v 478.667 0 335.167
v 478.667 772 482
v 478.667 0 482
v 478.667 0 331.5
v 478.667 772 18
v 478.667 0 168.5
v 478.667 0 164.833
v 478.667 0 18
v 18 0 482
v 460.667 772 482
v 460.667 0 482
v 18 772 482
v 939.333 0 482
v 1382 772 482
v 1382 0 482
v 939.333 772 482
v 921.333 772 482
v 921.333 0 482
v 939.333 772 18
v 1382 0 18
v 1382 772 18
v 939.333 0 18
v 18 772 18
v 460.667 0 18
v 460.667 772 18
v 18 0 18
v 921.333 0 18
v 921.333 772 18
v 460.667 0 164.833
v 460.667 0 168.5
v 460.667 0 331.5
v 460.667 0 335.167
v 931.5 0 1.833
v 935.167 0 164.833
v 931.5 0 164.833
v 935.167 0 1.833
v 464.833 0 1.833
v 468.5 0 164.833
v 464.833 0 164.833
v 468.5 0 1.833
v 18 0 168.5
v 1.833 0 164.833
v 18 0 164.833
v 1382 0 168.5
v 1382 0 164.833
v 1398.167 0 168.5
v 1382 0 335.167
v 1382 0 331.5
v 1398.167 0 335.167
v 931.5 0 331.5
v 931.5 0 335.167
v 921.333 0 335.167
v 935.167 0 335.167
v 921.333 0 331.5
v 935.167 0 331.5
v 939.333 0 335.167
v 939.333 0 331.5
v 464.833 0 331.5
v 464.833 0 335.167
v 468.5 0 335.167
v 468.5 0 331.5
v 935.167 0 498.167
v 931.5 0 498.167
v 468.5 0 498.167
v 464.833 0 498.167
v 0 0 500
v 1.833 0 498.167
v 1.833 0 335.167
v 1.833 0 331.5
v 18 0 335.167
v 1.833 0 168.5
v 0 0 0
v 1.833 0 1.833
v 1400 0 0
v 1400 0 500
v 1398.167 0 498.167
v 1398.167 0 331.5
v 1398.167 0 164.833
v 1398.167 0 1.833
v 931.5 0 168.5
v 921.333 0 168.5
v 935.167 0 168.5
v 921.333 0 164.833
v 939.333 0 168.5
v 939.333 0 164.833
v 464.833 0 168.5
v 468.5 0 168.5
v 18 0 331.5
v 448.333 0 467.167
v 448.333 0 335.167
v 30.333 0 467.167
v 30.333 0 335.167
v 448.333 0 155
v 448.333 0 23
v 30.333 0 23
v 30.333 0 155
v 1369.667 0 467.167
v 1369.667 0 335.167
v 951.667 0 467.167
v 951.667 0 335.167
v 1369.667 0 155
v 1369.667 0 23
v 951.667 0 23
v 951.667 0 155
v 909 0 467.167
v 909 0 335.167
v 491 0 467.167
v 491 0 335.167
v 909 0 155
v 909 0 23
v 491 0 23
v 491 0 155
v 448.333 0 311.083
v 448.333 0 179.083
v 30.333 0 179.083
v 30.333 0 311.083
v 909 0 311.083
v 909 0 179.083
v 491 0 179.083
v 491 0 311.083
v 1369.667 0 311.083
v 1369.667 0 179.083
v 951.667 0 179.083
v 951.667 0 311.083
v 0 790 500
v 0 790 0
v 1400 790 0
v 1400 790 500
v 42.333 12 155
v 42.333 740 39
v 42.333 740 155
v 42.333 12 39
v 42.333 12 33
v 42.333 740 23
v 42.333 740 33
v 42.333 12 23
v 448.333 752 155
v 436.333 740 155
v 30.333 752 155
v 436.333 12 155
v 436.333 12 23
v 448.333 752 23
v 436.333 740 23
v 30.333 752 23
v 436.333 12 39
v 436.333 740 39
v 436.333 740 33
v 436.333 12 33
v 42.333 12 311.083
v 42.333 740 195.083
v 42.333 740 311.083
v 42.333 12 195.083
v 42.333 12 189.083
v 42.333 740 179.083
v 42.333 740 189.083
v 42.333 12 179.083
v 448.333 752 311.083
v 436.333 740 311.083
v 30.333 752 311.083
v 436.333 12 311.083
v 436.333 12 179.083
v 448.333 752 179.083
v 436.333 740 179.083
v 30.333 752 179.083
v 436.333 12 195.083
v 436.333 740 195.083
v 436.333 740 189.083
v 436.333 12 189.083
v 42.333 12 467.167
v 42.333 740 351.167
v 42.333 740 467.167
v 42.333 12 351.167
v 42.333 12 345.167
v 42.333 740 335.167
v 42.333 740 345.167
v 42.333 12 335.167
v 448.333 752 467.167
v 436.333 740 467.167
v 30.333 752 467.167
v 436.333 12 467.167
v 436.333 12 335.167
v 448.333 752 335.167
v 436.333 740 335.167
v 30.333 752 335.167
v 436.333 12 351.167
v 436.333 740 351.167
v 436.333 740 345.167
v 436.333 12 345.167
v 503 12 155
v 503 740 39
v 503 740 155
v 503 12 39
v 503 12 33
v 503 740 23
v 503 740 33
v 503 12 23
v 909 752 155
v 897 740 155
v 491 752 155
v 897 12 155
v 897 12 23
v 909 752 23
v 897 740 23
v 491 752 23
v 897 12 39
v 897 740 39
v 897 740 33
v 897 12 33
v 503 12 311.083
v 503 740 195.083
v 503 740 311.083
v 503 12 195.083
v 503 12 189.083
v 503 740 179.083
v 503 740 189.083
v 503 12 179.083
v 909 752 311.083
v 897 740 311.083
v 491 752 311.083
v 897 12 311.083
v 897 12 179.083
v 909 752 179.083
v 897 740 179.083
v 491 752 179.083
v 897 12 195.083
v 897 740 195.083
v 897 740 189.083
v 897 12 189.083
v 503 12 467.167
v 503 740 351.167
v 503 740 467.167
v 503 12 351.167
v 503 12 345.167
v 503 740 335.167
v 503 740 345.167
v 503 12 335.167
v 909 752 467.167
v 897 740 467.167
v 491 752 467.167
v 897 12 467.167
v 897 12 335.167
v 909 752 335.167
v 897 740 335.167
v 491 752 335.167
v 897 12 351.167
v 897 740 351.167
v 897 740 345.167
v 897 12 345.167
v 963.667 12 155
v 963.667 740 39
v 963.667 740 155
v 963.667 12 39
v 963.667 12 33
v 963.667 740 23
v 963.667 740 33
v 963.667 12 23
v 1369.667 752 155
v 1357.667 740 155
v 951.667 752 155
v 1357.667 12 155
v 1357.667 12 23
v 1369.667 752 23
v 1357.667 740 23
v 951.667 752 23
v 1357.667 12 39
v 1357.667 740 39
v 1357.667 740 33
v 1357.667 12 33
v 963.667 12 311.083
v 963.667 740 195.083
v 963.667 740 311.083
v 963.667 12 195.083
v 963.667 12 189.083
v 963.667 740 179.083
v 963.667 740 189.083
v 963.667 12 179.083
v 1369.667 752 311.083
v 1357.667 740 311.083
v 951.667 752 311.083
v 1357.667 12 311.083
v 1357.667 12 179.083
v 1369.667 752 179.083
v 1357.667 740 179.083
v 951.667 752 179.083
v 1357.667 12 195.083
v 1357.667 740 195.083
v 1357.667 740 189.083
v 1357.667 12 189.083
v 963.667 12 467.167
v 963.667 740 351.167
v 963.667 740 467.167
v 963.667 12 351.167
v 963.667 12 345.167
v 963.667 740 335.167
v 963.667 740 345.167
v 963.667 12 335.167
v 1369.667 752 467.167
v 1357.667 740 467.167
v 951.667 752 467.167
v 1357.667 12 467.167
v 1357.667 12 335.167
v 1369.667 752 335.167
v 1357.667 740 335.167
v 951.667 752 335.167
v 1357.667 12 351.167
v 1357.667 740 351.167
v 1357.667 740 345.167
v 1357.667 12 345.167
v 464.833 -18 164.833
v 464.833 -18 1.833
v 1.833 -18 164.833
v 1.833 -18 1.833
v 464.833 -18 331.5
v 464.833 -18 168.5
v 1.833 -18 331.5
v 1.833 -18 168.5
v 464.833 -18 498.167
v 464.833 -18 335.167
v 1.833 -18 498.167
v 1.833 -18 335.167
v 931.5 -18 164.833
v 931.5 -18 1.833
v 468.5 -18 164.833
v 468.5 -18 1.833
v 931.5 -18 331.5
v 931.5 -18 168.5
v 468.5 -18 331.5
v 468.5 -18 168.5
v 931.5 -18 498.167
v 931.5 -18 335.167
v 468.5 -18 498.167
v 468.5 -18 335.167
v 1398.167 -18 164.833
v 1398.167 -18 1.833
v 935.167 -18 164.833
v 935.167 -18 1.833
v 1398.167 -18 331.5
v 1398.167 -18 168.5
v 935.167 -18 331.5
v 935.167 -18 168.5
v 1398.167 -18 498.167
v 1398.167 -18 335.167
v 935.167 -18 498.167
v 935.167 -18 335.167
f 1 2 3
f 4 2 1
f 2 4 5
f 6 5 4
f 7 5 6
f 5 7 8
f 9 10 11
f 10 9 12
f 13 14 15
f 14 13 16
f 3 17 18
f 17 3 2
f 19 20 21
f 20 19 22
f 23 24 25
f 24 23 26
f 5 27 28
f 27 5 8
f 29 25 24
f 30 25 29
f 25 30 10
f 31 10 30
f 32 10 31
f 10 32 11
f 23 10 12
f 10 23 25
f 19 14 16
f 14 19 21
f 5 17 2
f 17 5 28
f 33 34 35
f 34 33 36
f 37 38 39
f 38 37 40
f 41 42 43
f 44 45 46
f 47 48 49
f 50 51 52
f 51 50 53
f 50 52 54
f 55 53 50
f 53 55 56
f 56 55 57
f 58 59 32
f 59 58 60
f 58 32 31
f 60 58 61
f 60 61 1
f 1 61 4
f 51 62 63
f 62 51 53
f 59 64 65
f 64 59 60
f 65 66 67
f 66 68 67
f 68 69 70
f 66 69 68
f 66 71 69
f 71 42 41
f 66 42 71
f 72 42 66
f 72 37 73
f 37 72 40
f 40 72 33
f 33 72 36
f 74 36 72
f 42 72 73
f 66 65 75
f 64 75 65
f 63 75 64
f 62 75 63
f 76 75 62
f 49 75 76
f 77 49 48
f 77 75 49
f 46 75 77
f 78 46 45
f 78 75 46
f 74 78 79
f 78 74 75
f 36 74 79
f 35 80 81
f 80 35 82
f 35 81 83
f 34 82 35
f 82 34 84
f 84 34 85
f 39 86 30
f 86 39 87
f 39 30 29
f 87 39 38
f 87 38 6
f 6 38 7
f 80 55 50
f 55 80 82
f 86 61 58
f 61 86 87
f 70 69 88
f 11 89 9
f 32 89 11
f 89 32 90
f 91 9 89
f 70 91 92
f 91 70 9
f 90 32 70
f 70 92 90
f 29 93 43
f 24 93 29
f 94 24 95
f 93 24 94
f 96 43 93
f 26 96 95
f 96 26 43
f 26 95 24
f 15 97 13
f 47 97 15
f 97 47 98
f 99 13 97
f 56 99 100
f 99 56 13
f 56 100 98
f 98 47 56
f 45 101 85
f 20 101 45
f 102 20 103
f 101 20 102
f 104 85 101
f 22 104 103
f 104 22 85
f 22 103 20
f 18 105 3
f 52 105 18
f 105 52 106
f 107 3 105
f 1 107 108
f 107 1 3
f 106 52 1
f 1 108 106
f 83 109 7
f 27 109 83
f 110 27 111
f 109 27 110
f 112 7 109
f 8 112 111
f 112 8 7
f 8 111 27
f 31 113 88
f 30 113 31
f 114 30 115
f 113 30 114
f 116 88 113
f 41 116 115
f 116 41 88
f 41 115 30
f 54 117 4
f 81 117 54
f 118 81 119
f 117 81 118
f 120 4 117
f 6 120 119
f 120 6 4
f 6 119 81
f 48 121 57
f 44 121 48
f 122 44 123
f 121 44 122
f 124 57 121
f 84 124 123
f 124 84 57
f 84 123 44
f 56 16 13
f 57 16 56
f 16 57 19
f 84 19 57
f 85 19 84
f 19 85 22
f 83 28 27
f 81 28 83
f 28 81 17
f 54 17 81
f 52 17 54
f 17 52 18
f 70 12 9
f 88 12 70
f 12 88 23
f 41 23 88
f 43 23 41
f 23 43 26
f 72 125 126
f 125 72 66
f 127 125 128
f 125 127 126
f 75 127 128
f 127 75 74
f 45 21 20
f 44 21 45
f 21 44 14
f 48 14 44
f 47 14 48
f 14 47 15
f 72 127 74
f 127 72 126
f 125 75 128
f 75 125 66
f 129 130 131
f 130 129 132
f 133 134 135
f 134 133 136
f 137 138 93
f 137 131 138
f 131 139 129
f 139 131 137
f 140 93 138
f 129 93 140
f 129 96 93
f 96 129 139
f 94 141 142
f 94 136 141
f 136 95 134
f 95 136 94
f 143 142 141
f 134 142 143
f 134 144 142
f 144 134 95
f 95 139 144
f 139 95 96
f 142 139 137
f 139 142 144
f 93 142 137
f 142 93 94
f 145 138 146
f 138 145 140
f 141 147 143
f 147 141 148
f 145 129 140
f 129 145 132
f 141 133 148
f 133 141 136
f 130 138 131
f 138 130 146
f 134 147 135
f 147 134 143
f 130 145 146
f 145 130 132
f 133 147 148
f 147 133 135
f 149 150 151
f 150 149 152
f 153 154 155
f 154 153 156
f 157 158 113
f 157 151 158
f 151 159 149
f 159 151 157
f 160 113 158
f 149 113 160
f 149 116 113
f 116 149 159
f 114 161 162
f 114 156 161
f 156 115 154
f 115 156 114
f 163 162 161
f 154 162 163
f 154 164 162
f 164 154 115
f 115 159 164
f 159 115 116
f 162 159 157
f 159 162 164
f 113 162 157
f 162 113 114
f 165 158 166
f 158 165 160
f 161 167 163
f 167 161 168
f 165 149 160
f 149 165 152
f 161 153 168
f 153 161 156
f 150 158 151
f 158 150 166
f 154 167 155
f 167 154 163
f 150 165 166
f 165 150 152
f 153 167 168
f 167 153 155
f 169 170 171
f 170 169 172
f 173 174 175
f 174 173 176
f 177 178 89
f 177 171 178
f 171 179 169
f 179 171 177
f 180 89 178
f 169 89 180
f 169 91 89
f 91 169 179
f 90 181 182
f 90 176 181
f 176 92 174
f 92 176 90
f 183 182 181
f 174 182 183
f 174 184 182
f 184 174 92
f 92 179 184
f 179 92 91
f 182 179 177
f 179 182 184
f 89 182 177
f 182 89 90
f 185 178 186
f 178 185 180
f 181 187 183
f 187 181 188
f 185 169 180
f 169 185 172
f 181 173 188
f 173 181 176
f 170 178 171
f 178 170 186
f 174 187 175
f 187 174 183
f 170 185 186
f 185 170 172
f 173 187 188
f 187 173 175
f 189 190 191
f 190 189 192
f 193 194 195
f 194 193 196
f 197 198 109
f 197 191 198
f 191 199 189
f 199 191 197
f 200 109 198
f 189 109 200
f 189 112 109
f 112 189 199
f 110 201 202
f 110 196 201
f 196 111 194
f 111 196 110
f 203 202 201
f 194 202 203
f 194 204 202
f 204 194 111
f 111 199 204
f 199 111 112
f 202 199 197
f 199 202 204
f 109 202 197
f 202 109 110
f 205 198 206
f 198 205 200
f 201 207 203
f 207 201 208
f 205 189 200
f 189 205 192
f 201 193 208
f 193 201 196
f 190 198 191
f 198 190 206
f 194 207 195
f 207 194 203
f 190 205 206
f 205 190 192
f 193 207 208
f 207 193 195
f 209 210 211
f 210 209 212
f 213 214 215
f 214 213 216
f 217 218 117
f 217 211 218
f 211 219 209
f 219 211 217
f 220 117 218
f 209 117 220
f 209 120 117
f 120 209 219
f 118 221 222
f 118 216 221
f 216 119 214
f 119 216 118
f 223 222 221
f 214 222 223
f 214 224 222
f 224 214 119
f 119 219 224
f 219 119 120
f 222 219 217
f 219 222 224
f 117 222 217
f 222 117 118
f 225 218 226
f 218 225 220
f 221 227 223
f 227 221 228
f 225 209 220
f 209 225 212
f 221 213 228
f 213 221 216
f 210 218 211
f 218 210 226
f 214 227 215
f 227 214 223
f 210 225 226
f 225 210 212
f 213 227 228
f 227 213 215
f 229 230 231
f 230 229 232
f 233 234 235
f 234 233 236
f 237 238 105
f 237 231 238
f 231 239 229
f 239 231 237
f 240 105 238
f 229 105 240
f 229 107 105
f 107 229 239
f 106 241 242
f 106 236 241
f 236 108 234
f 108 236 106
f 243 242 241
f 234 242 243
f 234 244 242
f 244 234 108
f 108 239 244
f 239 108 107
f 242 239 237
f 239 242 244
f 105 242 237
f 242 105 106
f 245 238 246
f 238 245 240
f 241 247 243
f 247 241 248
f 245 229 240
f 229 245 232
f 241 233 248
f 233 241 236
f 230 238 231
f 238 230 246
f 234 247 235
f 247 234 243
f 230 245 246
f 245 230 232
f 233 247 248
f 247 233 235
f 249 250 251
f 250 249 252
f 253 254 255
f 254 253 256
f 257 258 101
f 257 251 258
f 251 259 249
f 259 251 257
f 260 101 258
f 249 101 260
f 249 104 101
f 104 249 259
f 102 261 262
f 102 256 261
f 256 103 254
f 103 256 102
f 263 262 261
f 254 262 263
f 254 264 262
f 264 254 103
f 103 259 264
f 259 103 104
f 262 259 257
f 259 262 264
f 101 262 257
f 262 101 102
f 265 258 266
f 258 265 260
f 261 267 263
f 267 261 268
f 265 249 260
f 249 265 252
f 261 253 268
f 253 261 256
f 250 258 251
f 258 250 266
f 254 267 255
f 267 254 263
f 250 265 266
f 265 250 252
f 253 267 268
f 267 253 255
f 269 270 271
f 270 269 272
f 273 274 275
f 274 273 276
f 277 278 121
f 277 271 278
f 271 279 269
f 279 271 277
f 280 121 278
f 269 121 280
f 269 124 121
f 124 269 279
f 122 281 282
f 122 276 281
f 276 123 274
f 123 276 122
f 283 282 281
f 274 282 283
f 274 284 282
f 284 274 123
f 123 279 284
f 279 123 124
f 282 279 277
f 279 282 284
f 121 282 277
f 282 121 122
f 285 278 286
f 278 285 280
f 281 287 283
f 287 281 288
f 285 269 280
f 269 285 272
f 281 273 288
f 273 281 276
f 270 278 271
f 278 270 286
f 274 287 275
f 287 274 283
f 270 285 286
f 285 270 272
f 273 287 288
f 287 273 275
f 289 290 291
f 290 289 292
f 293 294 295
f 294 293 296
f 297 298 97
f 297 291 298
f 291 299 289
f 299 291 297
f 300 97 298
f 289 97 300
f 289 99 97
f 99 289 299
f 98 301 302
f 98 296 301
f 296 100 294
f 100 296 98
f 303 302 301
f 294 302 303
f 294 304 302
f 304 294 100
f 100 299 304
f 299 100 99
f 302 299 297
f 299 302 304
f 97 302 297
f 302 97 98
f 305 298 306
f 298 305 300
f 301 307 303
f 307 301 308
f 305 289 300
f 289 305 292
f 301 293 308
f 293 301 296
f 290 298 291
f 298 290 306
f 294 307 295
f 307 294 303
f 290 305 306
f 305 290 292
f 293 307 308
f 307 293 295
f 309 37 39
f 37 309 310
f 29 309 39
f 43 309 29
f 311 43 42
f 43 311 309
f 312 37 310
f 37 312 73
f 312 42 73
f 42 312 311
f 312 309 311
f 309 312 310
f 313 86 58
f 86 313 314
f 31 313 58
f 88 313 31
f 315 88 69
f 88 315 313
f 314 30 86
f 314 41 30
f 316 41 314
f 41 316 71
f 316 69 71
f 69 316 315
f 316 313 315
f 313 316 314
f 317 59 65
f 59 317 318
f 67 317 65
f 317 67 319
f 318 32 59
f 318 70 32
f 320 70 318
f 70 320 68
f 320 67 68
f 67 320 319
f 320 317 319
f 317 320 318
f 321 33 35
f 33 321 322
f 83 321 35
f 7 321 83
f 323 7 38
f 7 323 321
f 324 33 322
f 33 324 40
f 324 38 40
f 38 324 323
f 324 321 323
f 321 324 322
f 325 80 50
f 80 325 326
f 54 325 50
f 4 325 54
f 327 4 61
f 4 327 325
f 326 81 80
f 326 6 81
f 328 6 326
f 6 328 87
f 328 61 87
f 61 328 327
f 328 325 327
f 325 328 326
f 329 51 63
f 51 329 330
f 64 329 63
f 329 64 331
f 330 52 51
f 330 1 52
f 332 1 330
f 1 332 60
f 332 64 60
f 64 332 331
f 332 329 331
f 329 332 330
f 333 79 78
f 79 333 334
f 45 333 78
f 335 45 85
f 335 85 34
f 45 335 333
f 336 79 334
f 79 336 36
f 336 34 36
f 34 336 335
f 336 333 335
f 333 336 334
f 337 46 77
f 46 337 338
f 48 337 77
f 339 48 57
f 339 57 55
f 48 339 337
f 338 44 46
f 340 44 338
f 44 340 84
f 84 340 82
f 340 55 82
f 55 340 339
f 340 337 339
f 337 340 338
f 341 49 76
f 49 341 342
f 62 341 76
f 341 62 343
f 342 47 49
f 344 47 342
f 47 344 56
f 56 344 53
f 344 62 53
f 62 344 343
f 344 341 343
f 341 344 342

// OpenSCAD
// Lowboard: 3 Abteile nebeneinander mit je 3 Schubladen.
// Die ganze Logik (Einteilung, Plan, Stückliste) kommt aus cupboard.scad,
// hier werden nur die Parameter überschrieben.
include <cupboard.scad>

width = 1400;
depth = 790;
height = 500;
wheelHeight = 0; // ohne Rollen; bei Bedarf Rollenhöhe eintragen (height ist inkl. Rollen)

compartments = 3;
smallDrawers = 3;
largeDrawers = 0;

drawerEnclosed = false;
